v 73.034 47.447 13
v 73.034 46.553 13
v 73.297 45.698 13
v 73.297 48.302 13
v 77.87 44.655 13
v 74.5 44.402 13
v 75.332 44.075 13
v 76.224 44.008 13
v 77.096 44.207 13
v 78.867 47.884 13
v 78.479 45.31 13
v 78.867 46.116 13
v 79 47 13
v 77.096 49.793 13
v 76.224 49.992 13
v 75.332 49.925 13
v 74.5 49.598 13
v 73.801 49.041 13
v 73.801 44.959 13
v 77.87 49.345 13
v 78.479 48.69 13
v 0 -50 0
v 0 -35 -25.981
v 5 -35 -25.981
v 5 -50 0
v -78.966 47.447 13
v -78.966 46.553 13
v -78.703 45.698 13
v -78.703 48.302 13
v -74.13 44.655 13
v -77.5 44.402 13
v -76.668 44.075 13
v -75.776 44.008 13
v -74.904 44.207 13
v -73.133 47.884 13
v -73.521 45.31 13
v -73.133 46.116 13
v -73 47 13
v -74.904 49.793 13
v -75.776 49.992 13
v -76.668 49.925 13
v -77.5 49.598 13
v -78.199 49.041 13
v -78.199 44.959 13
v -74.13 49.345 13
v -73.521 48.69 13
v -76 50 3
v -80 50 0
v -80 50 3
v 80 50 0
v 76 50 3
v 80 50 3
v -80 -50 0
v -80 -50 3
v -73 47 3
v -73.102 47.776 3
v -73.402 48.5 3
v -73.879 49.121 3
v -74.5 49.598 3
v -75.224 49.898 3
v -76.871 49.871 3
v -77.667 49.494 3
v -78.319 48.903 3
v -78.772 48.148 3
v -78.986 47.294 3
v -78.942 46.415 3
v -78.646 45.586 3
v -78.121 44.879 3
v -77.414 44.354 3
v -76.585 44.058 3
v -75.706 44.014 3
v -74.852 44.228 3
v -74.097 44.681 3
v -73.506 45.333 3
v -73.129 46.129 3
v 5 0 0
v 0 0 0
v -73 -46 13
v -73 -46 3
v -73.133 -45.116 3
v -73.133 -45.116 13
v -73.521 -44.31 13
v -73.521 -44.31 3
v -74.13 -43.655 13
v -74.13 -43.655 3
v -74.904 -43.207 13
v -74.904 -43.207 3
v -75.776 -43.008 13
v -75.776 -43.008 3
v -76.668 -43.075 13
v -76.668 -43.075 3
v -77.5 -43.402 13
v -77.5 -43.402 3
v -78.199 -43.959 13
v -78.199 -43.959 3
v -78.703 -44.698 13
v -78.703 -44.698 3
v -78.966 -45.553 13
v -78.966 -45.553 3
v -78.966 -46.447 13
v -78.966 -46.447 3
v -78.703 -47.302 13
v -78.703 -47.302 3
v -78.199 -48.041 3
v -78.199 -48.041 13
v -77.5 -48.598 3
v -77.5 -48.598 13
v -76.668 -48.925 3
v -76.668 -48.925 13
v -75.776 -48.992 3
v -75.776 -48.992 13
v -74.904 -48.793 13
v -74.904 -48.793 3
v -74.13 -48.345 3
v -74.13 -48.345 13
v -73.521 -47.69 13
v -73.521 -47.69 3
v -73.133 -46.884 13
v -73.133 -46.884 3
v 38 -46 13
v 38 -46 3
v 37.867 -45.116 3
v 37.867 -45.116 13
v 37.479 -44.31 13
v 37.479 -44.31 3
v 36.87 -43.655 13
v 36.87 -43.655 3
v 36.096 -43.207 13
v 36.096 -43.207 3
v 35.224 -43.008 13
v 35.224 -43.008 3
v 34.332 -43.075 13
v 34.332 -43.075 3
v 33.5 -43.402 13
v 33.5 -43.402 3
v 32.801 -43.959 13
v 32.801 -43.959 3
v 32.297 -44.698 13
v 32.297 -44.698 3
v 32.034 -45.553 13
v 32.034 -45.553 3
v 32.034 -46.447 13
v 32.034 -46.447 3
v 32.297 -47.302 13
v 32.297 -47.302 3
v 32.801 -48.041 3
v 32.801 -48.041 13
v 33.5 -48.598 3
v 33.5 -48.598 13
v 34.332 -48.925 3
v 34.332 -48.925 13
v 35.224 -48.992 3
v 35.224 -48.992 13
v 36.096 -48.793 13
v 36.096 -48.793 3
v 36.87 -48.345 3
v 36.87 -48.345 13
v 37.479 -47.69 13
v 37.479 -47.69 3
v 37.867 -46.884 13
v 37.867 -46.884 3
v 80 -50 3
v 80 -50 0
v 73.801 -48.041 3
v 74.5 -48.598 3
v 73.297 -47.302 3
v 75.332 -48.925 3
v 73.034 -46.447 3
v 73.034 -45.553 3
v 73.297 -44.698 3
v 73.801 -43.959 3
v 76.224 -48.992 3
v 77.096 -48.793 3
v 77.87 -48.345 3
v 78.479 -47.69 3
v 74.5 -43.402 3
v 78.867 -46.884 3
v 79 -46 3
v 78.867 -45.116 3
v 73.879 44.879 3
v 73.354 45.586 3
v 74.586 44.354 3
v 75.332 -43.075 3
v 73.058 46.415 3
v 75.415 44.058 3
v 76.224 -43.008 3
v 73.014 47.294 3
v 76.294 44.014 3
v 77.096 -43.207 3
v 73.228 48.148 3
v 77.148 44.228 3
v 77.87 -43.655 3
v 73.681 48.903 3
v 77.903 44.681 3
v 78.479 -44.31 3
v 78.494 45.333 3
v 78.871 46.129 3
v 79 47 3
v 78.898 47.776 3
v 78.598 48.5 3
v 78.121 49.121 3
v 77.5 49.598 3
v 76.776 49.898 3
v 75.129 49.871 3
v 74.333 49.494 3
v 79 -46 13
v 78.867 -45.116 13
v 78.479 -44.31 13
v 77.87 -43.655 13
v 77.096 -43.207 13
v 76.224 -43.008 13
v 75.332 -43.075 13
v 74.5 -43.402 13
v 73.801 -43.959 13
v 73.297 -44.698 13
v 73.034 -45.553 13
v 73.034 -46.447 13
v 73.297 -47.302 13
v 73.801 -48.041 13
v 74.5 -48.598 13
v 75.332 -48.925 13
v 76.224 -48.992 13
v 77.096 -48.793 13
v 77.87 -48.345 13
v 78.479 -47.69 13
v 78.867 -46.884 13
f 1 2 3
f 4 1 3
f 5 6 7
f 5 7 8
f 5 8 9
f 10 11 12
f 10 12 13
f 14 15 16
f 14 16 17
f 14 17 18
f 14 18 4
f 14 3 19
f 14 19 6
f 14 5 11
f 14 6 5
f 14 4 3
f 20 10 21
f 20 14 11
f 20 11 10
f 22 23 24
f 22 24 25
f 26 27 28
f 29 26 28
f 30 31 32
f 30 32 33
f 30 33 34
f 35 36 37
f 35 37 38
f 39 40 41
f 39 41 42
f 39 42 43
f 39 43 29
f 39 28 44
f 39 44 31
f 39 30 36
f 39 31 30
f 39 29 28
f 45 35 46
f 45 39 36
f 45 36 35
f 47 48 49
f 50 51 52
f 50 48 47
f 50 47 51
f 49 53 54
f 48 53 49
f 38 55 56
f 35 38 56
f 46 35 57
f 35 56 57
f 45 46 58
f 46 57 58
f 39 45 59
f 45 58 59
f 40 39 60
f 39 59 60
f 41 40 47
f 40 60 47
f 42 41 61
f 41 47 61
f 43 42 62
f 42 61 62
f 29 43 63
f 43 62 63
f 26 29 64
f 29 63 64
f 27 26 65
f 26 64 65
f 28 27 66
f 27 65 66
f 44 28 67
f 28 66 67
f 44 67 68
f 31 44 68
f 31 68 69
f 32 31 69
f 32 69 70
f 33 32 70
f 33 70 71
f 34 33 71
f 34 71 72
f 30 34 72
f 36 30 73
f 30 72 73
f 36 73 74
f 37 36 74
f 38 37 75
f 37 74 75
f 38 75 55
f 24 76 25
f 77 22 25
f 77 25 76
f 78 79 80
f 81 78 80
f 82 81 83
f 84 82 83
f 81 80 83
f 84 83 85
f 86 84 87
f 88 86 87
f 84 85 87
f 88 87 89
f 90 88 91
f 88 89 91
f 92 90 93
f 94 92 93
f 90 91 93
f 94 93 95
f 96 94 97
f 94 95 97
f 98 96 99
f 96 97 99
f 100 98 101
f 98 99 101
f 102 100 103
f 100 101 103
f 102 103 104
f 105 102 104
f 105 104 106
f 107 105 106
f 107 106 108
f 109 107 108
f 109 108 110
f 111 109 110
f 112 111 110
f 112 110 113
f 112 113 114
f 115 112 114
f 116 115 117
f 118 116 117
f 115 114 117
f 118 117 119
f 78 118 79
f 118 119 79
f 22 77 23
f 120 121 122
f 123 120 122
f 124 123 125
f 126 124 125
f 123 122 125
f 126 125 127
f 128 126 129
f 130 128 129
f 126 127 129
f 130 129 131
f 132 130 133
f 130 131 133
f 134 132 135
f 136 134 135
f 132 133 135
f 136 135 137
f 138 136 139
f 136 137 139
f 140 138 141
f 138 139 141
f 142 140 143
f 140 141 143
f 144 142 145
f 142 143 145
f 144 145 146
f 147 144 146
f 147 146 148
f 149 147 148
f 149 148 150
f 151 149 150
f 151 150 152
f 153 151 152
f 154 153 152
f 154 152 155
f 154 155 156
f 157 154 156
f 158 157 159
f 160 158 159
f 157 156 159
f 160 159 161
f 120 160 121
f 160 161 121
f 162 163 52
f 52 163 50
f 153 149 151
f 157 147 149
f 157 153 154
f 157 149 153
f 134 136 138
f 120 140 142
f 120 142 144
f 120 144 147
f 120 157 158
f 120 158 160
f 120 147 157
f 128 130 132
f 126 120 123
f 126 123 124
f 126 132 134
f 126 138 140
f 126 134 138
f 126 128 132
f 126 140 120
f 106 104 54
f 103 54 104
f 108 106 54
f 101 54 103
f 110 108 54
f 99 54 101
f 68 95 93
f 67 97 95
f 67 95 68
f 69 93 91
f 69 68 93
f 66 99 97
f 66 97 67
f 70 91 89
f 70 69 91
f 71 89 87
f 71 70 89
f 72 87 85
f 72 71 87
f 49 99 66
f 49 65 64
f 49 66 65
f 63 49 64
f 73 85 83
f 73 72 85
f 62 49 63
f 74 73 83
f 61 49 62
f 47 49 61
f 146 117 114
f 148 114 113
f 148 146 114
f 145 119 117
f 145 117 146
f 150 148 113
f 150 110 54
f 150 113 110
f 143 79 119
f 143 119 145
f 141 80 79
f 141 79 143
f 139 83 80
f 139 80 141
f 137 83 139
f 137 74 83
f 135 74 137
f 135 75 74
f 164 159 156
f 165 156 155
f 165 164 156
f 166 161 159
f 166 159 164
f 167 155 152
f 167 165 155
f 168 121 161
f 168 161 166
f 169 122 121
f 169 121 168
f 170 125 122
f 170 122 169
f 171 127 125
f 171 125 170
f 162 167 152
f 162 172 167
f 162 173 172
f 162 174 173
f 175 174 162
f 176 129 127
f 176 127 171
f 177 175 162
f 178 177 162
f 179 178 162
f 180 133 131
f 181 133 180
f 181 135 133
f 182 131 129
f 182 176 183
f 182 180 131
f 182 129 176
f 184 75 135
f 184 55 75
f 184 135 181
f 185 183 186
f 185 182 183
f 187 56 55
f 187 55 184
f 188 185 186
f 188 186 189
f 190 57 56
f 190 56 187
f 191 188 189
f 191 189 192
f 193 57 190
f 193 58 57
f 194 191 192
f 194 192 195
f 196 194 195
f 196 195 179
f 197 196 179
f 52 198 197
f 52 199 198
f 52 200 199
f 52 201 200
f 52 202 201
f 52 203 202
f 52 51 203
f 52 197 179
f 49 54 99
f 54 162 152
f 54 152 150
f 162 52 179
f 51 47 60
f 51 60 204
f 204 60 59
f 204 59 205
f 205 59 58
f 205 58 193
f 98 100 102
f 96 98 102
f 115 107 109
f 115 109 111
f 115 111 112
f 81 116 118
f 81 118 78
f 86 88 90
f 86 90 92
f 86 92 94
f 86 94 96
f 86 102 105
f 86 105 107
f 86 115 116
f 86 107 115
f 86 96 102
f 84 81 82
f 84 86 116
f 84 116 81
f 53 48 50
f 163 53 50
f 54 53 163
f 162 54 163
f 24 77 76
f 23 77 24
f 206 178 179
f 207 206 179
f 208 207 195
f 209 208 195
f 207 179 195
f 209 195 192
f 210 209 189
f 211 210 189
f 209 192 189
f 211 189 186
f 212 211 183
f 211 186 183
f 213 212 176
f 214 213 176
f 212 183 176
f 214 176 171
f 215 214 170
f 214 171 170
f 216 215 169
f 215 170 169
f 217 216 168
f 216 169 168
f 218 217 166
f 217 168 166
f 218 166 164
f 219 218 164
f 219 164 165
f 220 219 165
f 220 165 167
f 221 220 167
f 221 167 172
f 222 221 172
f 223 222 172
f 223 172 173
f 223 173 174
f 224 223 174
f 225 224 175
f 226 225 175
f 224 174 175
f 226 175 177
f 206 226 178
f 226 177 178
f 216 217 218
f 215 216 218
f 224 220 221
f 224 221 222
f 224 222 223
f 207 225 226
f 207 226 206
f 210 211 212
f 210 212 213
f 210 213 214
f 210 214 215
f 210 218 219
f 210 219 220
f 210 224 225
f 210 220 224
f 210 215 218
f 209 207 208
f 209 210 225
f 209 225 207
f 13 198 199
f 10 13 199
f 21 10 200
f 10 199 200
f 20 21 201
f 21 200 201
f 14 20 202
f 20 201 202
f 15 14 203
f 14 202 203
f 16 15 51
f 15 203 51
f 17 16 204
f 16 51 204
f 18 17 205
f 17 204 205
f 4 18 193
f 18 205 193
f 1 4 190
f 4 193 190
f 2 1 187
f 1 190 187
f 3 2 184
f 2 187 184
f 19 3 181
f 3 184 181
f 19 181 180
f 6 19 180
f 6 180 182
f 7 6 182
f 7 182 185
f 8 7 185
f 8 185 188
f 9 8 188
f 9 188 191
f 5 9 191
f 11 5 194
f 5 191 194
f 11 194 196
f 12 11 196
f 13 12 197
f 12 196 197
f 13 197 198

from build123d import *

# Parameters (mm, degrees)
SKETCH_W     = 160
SKETCH_H     = 100
PAD_DEPTH    = 3
SKETCH001_R  = 3
PAD001_DEPTH = 10
PAD002_DEPTH = 5


with BuildPart() as mainplate:
    # Sketch → Pad (new body)
    with BuildSketch(Plane.XY):
        Rectangle(SKETCH_W, SKETCH_H)
    extrude(amount=PAD_DEPTH)

    # Sketch001 (on Face6 of Pad) → Pad001 (join)
    with BuildSketch(Plane.XY.offset(3)):
        with Locations((-76, 47)):
            Circle(SKETCH001_R)
        with Locations((76, 47)):
            Circle(SKETCH001_R)
        with Locations((76, -46)):
            Circle(SKETCH001_R)
        with Locations((-76, -46)):
            Circle(SKETCH001_R)
        with Locations((35, -46)):
            Circle(SKETCH001_R)
    extrude(amount=PAD001_DEPTH)


with BuildPart() as mainplatesupports:
    # Sketch002 → Pad002 (new body)
    with BuildSketch(Plane.YZ):
        Polygon((-50, 0), (0, 0), (-35, -25.980762), align=None)
    extrude(amount=PAD002_DEPTH)


solid = Compound([mainplate.part, mainplatesupports.part])
